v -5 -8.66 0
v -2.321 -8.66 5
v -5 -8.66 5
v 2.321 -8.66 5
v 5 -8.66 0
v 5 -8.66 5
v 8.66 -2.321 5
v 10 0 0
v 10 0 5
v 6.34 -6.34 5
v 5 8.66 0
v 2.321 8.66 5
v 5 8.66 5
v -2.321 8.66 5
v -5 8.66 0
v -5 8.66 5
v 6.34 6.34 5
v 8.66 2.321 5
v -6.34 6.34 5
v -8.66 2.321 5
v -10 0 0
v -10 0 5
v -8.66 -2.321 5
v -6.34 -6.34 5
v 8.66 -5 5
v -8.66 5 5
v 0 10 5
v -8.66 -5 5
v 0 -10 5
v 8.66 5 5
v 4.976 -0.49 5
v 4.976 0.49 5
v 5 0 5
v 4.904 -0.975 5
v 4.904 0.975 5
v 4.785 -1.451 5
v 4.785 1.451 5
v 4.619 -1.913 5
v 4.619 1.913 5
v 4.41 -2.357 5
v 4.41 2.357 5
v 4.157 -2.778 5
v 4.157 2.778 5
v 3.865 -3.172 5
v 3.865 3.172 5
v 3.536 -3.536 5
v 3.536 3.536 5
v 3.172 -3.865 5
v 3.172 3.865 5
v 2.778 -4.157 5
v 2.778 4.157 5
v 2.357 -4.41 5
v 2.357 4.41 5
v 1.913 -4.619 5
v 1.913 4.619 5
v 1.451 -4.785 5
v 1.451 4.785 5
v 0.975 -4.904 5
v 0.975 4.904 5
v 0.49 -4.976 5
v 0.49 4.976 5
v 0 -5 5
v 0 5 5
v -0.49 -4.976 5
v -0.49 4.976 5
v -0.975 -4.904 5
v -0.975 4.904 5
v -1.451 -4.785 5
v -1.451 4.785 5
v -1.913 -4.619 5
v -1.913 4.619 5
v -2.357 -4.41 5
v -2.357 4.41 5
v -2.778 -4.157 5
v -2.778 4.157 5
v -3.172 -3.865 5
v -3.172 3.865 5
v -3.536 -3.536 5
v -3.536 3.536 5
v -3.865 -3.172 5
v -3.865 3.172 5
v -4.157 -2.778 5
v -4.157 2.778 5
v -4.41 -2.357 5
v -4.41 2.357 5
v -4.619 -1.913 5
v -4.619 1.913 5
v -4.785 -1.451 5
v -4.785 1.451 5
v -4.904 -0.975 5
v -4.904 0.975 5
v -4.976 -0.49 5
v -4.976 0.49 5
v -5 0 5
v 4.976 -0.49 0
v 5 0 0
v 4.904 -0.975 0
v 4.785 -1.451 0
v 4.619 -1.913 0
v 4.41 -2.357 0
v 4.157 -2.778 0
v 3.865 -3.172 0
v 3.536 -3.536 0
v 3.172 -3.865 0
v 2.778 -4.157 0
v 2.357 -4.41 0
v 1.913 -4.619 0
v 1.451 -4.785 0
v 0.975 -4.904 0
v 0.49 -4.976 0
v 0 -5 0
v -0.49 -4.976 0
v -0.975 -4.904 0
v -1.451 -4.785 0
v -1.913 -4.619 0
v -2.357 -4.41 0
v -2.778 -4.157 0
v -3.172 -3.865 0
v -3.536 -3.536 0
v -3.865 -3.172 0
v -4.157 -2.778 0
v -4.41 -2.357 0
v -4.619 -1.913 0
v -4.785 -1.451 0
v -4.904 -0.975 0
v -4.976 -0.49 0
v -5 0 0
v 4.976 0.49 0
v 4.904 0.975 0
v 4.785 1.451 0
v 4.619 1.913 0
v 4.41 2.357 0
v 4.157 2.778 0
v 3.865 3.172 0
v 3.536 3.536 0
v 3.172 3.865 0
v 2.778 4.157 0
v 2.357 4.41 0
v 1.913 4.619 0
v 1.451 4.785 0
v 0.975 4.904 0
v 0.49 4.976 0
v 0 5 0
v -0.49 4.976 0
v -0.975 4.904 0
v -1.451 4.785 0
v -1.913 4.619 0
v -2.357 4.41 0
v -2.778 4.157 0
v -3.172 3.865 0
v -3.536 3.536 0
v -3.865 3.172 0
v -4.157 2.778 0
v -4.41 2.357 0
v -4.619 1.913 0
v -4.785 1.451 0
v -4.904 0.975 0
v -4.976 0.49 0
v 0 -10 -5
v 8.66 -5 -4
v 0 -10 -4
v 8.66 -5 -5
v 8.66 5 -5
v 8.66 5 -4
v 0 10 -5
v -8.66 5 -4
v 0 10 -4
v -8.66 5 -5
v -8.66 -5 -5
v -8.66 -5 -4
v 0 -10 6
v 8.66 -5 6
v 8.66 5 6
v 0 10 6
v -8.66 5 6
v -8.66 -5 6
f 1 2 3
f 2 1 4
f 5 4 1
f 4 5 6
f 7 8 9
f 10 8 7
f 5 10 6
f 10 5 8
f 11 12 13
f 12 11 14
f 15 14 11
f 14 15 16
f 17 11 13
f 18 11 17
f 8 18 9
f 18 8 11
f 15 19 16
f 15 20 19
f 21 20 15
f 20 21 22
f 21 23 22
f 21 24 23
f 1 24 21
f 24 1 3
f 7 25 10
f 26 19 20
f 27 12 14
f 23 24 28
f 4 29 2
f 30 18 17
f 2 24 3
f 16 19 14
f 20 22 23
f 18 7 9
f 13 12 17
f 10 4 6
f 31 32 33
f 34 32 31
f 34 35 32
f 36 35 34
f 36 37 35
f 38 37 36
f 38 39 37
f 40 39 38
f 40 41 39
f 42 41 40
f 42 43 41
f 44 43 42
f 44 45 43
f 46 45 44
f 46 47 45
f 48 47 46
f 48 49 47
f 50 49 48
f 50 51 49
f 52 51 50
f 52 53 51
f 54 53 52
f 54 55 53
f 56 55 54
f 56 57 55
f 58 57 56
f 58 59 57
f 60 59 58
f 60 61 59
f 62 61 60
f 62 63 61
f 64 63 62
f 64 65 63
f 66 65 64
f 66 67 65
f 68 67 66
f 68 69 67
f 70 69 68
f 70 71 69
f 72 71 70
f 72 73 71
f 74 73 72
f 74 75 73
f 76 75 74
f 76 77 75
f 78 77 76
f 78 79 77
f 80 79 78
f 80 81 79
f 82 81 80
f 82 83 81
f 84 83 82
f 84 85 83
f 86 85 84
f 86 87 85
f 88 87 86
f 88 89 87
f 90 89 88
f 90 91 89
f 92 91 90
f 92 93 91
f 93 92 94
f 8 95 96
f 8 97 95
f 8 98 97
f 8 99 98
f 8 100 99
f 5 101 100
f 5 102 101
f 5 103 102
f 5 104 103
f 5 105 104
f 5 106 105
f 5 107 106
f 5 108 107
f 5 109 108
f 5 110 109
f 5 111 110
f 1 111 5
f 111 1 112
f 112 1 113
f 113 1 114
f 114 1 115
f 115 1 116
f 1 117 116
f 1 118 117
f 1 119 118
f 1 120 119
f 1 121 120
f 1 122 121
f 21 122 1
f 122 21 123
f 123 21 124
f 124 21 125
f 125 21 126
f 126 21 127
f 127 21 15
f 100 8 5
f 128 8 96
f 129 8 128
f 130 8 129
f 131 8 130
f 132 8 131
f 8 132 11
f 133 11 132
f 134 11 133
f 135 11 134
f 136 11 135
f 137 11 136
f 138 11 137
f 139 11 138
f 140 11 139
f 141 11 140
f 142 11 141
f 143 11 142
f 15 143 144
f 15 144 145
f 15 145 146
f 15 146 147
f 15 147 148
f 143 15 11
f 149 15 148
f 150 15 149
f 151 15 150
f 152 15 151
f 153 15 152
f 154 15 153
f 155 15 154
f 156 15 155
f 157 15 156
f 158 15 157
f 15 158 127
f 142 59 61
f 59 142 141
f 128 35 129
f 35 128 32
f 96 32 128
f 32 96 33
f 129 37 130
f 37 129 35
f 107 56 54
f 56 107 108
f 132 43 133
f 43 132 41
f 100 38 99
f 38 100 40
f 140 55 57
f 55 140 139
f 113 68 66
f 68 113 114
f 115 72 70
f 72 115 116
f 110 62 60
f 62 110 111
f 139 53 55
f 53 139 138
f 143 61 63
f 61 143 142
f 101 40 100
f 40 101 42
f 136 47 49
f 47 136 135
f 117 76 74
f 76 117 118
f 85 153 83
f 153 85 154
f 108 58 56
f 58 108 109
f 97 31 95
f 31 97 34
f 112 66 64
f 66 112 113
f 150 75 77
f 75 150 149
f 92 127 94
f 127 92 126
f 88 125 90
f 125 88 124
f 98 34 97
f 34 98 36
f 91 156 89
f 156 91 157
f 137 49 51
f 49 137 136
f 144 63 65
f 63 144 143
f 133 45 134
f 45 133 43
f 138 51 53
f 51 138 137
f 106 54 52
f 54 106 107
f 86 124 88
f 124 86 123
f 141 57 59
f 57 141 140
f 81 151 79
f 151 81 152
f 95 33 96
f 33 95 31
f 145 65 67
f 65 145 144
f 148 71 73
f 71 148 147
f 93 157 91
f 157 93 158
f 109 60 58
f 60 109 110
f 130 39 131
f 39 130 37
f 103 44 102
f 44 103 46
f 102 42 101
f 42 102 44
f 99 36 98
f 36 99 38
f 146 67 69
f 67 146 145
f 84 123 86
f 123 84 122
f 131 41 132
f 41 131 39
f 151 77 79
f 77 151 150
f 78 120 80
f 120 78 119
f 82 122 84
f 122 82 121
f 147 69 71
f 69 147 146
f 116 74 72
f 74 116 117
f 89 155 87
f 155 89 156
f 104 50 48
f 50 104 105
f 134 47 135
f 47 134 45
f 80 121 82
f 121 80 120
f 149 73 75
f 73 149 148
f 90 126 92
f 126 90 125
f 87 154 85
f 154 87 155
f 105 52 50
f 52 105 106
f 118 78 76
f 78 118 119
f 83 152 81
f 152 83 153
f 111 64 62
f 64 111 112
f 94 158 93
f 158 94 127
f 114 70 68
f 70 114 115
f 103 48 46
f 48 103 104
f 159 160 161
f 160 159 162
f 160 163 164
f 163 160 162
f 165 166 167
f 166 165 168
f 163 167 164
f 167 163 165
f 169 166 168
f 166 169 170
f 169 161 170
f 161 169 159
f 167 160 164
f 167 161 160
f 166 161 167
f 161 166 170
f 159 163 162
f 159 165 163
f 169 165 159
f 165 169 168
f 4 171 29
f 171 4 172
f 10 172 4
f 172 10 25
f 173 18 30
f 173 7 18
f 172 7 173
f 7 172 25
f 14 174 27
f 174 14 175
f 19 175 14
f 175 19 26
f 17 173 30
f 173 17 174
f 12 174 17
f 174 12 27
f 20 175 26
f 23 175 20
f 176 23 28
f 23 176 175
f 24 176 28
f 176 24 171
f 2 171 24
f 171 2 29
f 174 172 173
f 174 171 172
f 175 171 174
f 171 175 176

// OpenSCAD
module hex_nut() {
    difference() {
        // Hexagonal prism
        scale([1, 1, 0.5])
            cylinder(r=10, h=10, $fn=6);
        
        // Central circular through-hole
        translate([0, 0, -5])
            cylinder(r=5, h=20, $fn=64);
    }
    
    // Chamfer top and bottom edges
    for (z = [-5, 5]) {
        translate([0, 0, z])
            rotate([0, 0, 30])
                scale([1, 1, 0.1])
                    cylinder(r=10, h=10, $fn=6);
    }
}

hex_nut();
